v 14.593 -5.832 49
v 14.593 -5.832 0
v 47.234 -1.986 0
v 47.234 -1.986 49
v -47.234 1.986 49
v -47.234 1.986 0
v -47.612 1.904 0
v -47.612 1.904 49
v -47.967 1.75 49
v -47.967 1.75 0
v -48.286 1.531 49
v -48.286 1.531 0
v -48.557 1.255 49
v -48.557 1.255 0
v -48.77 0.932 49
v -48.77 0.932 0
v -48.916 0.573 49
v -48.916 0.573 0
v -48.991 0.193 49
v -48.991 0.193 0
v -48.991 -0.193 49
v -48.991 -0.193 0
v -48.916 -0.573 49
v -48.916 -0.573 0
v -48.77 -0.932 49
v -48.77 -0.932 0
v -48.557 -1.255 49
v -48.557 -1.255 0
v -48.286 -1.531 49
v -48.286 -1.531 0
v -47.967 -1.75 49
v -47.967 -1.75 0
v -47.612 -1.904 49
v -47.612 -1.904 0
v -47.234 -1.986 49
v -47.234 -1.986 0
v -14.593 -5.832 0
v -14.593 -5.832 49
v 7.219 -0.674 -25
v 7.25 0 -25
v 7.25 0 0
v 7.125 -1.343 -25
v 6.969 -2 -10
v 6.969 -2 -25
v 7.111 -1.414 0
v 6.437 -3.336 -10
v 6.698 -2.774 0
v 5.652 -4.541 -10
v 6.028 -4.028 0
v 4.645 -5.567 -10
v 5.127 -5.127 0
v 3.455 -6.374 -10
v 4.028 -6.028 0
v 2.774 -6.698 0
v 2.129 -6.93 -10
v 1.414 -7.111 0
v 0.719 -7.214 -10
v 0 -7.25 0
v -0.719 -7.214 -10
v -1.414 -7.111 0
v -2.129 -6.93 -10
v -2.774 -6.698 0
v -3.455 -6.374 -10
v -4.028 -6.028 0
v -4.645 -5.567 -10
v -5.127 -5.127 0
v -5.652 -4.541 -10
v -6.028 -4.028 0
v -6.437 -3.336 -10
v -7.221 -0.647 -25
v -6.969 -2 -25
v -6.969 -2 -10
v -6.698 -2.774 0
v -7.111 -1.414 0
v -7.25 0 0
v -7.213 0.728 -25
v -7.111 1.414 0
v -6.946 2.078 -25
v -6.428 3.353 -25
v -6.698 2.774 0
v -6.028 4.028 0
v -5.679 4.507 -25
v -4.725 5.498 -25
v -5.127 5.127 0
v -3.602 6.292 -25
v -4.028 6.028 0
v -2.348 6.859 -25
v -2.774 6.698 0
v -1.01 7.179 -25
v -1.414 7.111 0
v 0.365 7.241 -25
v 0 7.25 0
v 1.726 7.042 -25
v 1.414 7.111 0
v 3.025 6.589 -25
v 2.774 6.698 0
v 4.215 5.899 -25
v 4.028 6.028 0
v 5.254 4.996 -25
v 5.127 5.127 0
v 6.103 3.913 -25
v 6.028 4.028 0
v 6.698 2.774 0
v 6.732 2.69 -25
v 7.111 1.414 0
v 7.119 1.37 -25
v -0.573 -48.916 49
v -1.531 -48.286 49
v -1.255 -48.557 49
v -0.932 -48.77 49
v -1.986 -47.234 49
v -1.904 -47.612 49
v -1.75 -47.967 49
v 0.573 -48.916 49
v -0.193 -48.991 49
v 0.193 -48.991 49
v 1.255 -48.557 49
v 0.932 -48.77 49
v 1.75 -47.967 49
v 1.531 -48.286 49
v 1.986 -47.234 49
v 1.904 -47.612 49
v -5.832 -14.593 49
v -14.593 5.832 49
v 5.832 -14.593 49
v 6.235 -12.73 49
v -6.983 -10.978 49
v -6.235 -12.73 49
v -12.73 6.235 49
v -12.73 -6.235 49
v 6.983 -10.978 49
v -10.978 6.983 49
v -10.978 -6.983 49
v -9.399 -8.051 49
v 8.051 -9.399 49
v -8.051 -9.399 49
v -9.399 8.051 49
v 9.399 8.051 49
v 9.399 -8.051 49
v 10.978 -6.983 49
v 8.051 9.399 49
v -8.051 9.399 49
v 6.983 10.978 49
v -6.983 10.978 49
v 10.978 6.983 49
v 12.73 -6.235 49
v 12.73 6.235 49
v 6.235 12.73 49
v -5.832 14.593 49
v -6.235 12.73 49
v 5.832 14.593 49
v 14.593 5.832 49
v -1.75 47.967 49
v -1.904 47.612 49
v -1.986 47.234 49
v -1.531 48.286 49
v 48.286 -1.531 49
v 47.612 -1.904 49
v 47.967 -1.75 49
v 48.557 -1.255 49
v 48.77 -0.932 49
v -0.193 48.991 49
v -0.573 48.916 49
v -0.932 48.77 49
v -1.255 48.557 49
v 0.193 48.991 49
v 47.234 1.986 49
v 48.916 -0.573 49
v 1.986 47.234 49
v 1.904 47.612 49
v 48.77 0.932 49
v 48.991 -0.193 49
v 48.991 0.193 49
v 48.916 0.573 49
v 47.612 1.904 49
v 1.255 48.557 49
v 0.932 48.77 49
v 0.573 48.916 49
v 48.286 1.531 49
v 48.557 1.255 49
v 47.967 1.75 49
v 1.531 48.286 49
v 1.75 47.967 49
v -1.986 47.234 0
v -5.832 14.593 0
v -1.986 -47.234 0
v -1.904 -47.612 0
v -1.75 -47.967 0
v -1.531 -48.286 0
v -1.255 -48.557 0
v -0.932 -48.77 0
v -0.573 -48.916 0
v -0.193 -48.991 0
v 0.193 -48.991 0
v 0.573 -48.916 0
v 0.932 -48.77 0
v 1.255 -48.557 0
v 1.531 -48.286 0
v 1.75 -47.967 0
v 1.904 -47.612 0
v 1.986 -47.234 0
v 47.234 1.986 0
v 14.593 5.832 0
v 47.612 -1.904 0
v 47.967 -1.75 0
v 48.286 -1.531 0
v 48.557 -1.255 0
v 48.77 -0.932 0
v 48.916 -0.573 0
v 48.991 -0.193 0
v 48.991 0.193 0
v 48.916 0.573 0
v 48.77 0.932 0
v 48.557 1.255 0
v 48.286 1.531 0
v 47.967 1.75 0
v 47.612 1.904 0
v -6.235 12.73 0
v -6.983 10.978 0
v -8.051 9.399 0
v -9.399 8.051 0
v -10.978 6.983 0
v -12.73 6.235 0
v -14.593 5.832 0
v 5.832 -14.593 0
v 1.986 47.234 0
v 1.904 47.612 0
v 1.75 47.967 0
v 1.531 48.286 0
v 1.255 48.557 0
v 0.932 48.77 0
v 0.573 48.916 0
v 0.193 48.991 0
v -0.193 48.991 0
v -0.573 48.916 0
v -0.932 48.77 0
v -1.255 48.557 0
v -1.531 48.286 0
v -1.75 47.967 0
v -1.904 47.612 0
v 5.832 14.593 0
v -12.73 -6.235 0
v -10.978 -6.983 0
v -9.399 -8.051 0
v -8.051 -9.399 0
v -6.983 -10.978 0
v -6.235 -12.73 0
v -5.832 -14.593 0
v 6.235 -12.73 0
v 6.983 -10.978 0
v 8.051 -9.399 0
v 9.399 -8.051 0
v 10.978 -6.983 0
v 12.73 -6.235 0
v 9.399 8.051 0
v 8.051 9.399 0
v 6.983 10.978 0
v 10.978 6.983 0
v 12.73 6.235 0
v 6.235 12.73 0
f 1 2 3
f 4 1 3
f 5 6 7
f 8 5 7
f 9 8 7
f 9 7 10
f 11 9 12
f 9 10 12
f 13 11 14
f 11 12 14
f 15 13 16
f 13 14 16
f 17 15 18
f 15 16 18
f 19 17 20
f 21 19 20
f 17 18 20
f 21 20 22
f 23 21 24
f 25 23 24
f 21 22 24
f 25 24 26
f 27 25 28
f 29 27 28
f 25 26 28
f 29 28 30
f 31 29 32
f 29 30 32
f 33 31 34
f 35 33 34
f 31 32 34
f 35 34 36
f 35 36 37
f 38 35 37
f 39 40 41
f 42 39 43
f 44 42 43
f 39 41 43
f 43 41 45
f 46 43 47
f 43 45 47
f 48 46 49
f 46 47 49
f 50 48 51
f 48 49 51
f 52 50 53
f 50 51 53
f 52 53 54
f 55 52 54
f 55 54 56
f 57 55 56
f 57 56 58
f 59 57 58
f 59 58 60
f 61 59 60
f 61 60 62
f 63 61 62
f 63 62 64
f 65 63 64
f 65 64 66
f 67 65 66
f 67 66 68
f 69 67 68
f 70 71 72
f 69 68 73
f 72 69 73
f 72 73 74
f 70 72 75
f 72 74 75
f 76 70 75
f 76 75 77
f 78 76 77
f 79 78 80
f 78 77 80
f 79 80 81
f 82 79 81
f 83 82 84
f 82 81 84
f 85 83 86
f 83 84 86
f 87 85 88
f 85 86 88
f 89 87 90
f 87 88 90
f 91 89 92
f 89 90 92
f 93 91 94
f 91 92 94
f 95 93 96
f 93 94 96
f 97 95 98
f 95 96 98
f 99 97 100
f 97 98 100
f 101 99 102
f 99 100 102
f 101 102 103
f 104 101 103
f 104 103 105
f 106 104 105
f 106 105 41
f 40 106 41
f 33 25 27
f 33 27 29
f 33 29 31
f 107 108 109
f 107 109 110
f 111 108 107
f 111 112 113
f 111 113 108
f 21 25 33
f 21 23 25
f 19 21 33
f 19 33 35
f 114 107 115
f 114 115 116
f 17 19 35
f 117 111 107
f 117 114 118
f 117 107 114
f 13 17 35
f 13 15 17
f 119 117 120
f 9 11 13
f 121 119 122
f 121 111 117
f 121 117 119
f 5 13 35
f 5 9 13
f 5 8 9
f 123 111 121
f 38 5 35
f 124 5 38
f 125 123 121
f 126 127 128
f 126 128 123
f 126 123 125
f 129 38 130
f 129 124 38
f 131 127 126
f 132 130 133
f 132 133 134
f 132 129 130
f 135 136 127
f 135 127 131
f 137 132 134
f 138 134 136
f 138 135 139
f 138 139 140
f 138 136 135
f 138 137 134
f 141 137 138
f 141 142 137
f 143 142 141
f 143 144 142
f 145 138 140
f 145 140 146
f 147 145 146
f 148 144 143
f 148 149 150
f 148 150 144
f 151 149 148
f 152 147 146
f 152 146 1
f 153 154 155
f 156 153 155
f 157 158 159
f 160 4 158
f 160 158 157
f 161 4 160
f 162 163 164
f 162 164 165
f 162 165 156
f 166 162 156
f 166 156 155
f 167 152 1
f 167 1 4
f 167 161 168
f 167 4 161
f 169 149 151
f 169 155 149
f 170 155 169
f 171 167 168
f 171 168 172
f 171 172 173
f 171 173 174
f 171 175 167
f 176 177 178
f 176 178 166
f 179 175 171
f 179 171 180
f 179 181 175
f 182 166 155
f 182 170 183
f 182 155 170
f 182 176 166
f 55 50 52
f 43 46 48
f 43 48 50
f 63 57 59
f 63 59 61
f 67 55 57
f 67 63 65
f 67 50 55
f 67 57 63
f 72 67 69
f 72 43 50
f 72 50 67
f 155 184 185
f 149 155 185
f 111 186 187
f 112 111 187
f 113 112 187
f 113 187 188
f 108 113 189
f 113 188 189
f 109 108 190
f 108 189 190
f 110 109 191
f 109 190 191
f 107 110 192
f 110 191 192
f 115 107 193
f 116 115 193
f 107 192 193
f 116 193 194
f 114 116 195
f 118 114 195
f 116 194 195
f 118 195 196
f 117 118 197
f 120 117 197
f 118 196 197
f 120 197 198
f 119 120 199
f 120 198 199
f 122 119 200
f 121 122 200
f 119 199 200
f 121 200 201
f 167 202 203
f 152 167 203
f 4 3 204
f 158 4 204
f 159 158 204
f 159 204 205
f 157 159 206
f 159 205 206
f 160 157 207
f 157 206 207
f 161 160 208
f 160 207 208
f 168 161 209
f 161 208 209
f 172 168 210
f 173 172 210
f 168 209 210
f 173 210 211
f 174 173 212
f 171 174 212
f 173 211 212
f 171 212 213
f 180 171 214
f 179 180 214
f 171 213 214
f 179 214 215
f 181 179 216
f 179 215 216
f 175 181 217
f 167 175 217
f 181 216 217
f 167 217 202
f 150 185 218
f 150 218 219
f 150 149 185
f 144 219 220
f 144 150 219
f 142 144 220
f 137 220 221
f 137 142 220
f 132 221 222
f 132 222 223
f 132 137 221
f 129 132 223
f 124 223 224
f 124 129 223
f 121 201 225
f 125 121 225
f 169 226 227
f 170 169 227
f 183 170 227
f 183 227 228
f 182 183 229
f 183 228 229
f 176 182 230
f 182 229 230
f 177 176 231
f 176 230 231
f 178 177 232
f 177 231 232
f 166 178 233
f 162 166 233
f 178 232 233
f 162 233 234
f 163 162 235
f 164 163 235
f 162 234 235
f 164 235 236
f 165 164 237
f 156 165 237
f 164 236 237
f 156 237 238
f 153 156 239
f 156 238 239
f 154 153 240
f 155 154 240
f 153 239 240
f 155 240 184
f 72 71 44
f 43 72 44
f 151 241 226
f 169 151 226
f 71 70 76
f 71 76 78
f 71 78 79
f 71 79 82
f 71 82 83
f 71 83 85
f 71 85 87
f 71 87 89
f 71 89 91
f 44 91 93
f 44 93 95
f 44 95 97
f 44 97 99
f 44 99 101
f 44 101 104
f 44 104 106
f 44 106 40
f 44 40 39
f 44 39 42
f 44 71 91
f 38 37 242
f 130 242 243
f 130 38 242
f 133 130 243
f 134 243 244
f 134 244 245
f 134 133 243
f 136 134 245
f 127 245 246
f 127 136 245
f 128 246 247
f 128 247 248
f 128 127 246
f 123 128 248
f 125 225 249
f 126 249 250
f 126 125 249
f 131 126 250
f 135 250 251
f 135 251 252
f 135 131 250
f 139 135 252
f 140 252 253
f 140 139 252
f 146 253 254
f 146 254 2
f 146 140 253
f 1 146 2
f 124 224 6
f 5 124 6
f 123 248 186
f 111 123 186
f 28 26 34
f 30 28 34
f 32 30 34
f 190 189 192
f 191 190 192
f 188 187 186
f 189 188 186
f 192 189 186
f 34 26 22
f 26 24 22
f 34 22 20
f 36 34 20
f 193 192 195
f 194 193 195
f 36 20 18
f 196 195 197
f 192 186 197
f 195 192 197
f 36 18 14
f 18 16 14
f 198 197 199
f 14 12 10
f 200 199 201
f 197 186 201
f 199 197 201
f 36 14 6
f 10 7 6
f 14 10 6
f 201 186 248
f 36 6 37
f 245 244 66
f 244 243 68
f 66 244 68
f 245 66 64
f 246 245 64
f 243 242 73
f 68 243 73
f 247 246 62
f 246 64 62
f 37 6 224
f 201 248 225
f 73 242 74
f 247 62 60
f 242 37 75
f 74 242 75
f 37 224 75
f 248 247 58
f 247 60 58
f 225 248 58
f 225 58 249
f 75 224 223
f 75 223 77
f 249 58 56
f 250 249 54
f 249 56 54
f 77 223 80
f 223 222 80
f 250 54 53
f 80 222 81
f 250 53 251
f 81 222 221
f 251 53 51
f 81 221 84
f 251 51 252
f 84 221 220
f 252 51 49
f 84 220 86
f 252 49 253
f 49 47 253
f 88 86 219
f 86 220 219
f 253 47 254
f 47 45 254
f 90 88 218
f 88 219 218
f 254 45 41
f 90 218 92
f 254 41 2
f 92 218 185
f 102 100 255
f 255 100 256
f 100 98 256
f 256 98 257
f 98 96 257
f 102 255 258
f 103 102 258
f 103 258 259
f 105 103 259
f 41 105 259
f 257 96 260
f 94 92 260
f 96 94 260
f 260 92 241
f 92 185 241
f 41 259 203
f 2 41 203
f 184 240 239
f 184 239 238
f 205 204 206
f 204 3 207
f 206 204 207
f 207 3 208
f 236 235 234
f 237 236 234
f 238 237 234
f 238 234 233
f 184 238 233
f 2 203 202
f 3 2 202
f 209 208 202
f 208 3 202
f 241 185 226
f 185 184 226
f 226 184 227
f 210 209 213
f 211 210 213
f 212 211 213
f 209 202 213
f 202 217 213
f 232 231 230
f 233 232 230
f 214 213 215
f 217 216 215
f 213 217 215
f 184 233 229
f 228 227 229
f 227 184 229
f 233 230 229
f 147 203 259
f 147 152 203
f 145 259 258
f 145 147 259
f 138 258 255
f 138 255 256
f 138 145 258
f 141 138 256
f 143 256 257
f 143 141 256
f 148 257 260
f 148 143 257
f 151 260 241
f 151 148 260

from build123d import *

# Parameters (mm, degrees)
SKETCH1_R           = 7.5
BOSS_EXTRUDE1_DEPTH = 49
FILLET1_R           = 10
SKETCH2_R           = 7.25
BOSS_EXTRUDE2_DEPTH = 25
CUT_EXTRUDE1_START  = -15
CUT_EXTRUDE1_DEPTH  = 15


with BuildPart() as part:
    # Sketch1 → Boss-Extrude1 (new body)
    with BuildSketch(Plane.XY):
        with BuildLine():
            ThreePointArc((-7.448470559, -0.877659574), (-7.5, 0), (-7.448470559, 0.877659574))
            Line((-7.448470559, 0.877659574), (-6.755839639, 6.755839639))
            Line((-6.755839639, 6.755839639), (-47.234042553, 1.986258816))
            ThreePointArc((-47.234042553, 1.986258816), (-49, 0), (-47.234042553, -1.986258816))
            Line((-47.234042553, -1.986258816), (-6.755839639, -6.755839639))
            Line((-6.755839639, -6.755839639), (-7.448470559, -0.877659574))
        make_face()
        with BuildLine():
            Line((-1.986258816, 47.234042553), (-6.755839639, 6.755839639))
            Line((-6.755839639, 6.755839639), (-0.877659574, 7.448470559))
            ThreePointArc((-0.877659574, 7.448470559), (0, 7.5), (0.877659574, 7.448470559))
            Line((0.877659574, 7.448470559), (6.755839639, 6.755839639))
            Line((6.755839639, 6.755839639), (1.986258816, 47.234042553))
            ThreePointArc((1.986258816, 47.234042553), (0, 49), (-1.986258816, 47.234042553))
        make_face()
        with BuildLine():
            Line((47.234042553, 1.986258816), (6.755839639, 6.755839639))
            Line((6.755839639, 6.755839639), (7.448470559, 0.877659574))
            ThreePointArc((7.448470559, 0.877659574), (7.487106557, 0.43958549), (7.5, 0))
            ThreePointArc((7.5, 0), (7.487106557, -0.43958549), (7.448470559, -0.877659574))
            Line((7.448470559, -0.877659574), (6.755839639, -6.755839639))
            Line((6.755839639, -6.755839639), (47.234042553, -1.986258816))
            ThreePointArc((47.234042553, -1.986258816), (49, 0), (47.234042553, 1.986258816))
        make_face()
        with BuildLine():
            Line((-0.877659574, -7.448470559), (-6.755839639, -6.755839639))
            Line((-6.755839639, -6.755839639), (-1.986258816, -47.234042553))
            ThreePointArc((-1.986258816, -47.234042553), (0, -49), (1.986258816, -47.234042553))
            Line((1.986258816, -47.234042553), (6.755839639, -6.755839639))
            Line((6.755839639, -6.755839639), (0.877659574, -7.448470559))
            ThreePointArc((0.877659574, -7.448470559), (0, -7.5), (-0.877659574, -7.448470559))
        make_face()
        with BuildLine():
            Line((-6.755839639, 6.755839639), (-7.448470559, 0.877659574))
            ThreePointArc((-7.448470559, 0.877659574), (-5.303300859, 5.303300859), (-0.877659574, 7.448470559))
            Line((-0.877659574, 7.448470559), (-6.755839639, 6.755839639))
        make_face()
        Circle(SKETCH1_R)
        with BuildLine():
            Line((6.755839639, 6.755839639), (0.877659574, 7.448470559))
            ThreePointArc((0.877659574, 7.448470559), (5.303300859, 5.303300859), (7.448470559, 0.877659574))
            Line((7.448470559, 0.877659574), (6.755839639, 6.755839639))
        make_face()
        with BuildLine():
            ThreePointArc((7.448470559, -0.877659574), (5.303300859, -5.303300859), (0.877659574, -7.448470559))
            Line((0.877659574, -7.448470559), (6.755839639, -6.755839639))
            Line((6.755839639, -6.755839639), (7.448470559, -0.877659574))
        make_face()
        with BuildLine():
            ThreePointArc((-0.877659574, -7.448470559), (-5.303300859, -5.303300859), (-7.448470559, -0.877659574))
            Line((-7.448470559, -0.877659574), (-6.755839639, -6.755839639))
            Line((-6.755839639, -6.755839639), (-0.877659574, -7.448470559))
        make_face()
    extrude(amount=BOSS_EXTRUDE1_DEPTH)

    # Fillet1
    fillet1_edges = [part.edges().sort_by_distance(p)[0] for p in [
        (6.755839639, 6.755839639, 24.5),
        (6.755839639, -6.755839639, 24.5),
        (-6.755839639, -6.755839639, 24.5),
        (-6.755839639, 6.755839639, 24.5),
    ]]
    fillet(fillet1_edges, radius=FILLET1_R)

    # Sketch2 → Boss-Extrude2 (add)
    with BuildSketch(Plane(origin=(0, 0, 0), x_dir=(-1, 0, 0), z_dir=(0, 0, -1))):
        with Locations(Location((0, 0, 0), (0, 0, 180))):
            Circle(SKETCH2_R)
    extrude(amount=BOSS_EXTRUDE2_DEPTH)

    # Sketch3 → Cut-Extrude1 (cut)
    with BuildSketch(Plane(origin=(0, 0, -25), x_dir=(-1, 0, 0), z_dir=(0, 0, -1)).offset(CUT_EXTRUDE1_START)):
        with BuildLine():
            Line((6.968679932, -2), (-6.968679932, -2))
            ThreePointArc((-6.968679932, -2), (0, -7.25), (6.968679932, -2))
        make_face()
    extrude(amount=CUT_EXTRUDE1_DEPTH, mode=Mode.SUBTRACT)


solid = part.part
